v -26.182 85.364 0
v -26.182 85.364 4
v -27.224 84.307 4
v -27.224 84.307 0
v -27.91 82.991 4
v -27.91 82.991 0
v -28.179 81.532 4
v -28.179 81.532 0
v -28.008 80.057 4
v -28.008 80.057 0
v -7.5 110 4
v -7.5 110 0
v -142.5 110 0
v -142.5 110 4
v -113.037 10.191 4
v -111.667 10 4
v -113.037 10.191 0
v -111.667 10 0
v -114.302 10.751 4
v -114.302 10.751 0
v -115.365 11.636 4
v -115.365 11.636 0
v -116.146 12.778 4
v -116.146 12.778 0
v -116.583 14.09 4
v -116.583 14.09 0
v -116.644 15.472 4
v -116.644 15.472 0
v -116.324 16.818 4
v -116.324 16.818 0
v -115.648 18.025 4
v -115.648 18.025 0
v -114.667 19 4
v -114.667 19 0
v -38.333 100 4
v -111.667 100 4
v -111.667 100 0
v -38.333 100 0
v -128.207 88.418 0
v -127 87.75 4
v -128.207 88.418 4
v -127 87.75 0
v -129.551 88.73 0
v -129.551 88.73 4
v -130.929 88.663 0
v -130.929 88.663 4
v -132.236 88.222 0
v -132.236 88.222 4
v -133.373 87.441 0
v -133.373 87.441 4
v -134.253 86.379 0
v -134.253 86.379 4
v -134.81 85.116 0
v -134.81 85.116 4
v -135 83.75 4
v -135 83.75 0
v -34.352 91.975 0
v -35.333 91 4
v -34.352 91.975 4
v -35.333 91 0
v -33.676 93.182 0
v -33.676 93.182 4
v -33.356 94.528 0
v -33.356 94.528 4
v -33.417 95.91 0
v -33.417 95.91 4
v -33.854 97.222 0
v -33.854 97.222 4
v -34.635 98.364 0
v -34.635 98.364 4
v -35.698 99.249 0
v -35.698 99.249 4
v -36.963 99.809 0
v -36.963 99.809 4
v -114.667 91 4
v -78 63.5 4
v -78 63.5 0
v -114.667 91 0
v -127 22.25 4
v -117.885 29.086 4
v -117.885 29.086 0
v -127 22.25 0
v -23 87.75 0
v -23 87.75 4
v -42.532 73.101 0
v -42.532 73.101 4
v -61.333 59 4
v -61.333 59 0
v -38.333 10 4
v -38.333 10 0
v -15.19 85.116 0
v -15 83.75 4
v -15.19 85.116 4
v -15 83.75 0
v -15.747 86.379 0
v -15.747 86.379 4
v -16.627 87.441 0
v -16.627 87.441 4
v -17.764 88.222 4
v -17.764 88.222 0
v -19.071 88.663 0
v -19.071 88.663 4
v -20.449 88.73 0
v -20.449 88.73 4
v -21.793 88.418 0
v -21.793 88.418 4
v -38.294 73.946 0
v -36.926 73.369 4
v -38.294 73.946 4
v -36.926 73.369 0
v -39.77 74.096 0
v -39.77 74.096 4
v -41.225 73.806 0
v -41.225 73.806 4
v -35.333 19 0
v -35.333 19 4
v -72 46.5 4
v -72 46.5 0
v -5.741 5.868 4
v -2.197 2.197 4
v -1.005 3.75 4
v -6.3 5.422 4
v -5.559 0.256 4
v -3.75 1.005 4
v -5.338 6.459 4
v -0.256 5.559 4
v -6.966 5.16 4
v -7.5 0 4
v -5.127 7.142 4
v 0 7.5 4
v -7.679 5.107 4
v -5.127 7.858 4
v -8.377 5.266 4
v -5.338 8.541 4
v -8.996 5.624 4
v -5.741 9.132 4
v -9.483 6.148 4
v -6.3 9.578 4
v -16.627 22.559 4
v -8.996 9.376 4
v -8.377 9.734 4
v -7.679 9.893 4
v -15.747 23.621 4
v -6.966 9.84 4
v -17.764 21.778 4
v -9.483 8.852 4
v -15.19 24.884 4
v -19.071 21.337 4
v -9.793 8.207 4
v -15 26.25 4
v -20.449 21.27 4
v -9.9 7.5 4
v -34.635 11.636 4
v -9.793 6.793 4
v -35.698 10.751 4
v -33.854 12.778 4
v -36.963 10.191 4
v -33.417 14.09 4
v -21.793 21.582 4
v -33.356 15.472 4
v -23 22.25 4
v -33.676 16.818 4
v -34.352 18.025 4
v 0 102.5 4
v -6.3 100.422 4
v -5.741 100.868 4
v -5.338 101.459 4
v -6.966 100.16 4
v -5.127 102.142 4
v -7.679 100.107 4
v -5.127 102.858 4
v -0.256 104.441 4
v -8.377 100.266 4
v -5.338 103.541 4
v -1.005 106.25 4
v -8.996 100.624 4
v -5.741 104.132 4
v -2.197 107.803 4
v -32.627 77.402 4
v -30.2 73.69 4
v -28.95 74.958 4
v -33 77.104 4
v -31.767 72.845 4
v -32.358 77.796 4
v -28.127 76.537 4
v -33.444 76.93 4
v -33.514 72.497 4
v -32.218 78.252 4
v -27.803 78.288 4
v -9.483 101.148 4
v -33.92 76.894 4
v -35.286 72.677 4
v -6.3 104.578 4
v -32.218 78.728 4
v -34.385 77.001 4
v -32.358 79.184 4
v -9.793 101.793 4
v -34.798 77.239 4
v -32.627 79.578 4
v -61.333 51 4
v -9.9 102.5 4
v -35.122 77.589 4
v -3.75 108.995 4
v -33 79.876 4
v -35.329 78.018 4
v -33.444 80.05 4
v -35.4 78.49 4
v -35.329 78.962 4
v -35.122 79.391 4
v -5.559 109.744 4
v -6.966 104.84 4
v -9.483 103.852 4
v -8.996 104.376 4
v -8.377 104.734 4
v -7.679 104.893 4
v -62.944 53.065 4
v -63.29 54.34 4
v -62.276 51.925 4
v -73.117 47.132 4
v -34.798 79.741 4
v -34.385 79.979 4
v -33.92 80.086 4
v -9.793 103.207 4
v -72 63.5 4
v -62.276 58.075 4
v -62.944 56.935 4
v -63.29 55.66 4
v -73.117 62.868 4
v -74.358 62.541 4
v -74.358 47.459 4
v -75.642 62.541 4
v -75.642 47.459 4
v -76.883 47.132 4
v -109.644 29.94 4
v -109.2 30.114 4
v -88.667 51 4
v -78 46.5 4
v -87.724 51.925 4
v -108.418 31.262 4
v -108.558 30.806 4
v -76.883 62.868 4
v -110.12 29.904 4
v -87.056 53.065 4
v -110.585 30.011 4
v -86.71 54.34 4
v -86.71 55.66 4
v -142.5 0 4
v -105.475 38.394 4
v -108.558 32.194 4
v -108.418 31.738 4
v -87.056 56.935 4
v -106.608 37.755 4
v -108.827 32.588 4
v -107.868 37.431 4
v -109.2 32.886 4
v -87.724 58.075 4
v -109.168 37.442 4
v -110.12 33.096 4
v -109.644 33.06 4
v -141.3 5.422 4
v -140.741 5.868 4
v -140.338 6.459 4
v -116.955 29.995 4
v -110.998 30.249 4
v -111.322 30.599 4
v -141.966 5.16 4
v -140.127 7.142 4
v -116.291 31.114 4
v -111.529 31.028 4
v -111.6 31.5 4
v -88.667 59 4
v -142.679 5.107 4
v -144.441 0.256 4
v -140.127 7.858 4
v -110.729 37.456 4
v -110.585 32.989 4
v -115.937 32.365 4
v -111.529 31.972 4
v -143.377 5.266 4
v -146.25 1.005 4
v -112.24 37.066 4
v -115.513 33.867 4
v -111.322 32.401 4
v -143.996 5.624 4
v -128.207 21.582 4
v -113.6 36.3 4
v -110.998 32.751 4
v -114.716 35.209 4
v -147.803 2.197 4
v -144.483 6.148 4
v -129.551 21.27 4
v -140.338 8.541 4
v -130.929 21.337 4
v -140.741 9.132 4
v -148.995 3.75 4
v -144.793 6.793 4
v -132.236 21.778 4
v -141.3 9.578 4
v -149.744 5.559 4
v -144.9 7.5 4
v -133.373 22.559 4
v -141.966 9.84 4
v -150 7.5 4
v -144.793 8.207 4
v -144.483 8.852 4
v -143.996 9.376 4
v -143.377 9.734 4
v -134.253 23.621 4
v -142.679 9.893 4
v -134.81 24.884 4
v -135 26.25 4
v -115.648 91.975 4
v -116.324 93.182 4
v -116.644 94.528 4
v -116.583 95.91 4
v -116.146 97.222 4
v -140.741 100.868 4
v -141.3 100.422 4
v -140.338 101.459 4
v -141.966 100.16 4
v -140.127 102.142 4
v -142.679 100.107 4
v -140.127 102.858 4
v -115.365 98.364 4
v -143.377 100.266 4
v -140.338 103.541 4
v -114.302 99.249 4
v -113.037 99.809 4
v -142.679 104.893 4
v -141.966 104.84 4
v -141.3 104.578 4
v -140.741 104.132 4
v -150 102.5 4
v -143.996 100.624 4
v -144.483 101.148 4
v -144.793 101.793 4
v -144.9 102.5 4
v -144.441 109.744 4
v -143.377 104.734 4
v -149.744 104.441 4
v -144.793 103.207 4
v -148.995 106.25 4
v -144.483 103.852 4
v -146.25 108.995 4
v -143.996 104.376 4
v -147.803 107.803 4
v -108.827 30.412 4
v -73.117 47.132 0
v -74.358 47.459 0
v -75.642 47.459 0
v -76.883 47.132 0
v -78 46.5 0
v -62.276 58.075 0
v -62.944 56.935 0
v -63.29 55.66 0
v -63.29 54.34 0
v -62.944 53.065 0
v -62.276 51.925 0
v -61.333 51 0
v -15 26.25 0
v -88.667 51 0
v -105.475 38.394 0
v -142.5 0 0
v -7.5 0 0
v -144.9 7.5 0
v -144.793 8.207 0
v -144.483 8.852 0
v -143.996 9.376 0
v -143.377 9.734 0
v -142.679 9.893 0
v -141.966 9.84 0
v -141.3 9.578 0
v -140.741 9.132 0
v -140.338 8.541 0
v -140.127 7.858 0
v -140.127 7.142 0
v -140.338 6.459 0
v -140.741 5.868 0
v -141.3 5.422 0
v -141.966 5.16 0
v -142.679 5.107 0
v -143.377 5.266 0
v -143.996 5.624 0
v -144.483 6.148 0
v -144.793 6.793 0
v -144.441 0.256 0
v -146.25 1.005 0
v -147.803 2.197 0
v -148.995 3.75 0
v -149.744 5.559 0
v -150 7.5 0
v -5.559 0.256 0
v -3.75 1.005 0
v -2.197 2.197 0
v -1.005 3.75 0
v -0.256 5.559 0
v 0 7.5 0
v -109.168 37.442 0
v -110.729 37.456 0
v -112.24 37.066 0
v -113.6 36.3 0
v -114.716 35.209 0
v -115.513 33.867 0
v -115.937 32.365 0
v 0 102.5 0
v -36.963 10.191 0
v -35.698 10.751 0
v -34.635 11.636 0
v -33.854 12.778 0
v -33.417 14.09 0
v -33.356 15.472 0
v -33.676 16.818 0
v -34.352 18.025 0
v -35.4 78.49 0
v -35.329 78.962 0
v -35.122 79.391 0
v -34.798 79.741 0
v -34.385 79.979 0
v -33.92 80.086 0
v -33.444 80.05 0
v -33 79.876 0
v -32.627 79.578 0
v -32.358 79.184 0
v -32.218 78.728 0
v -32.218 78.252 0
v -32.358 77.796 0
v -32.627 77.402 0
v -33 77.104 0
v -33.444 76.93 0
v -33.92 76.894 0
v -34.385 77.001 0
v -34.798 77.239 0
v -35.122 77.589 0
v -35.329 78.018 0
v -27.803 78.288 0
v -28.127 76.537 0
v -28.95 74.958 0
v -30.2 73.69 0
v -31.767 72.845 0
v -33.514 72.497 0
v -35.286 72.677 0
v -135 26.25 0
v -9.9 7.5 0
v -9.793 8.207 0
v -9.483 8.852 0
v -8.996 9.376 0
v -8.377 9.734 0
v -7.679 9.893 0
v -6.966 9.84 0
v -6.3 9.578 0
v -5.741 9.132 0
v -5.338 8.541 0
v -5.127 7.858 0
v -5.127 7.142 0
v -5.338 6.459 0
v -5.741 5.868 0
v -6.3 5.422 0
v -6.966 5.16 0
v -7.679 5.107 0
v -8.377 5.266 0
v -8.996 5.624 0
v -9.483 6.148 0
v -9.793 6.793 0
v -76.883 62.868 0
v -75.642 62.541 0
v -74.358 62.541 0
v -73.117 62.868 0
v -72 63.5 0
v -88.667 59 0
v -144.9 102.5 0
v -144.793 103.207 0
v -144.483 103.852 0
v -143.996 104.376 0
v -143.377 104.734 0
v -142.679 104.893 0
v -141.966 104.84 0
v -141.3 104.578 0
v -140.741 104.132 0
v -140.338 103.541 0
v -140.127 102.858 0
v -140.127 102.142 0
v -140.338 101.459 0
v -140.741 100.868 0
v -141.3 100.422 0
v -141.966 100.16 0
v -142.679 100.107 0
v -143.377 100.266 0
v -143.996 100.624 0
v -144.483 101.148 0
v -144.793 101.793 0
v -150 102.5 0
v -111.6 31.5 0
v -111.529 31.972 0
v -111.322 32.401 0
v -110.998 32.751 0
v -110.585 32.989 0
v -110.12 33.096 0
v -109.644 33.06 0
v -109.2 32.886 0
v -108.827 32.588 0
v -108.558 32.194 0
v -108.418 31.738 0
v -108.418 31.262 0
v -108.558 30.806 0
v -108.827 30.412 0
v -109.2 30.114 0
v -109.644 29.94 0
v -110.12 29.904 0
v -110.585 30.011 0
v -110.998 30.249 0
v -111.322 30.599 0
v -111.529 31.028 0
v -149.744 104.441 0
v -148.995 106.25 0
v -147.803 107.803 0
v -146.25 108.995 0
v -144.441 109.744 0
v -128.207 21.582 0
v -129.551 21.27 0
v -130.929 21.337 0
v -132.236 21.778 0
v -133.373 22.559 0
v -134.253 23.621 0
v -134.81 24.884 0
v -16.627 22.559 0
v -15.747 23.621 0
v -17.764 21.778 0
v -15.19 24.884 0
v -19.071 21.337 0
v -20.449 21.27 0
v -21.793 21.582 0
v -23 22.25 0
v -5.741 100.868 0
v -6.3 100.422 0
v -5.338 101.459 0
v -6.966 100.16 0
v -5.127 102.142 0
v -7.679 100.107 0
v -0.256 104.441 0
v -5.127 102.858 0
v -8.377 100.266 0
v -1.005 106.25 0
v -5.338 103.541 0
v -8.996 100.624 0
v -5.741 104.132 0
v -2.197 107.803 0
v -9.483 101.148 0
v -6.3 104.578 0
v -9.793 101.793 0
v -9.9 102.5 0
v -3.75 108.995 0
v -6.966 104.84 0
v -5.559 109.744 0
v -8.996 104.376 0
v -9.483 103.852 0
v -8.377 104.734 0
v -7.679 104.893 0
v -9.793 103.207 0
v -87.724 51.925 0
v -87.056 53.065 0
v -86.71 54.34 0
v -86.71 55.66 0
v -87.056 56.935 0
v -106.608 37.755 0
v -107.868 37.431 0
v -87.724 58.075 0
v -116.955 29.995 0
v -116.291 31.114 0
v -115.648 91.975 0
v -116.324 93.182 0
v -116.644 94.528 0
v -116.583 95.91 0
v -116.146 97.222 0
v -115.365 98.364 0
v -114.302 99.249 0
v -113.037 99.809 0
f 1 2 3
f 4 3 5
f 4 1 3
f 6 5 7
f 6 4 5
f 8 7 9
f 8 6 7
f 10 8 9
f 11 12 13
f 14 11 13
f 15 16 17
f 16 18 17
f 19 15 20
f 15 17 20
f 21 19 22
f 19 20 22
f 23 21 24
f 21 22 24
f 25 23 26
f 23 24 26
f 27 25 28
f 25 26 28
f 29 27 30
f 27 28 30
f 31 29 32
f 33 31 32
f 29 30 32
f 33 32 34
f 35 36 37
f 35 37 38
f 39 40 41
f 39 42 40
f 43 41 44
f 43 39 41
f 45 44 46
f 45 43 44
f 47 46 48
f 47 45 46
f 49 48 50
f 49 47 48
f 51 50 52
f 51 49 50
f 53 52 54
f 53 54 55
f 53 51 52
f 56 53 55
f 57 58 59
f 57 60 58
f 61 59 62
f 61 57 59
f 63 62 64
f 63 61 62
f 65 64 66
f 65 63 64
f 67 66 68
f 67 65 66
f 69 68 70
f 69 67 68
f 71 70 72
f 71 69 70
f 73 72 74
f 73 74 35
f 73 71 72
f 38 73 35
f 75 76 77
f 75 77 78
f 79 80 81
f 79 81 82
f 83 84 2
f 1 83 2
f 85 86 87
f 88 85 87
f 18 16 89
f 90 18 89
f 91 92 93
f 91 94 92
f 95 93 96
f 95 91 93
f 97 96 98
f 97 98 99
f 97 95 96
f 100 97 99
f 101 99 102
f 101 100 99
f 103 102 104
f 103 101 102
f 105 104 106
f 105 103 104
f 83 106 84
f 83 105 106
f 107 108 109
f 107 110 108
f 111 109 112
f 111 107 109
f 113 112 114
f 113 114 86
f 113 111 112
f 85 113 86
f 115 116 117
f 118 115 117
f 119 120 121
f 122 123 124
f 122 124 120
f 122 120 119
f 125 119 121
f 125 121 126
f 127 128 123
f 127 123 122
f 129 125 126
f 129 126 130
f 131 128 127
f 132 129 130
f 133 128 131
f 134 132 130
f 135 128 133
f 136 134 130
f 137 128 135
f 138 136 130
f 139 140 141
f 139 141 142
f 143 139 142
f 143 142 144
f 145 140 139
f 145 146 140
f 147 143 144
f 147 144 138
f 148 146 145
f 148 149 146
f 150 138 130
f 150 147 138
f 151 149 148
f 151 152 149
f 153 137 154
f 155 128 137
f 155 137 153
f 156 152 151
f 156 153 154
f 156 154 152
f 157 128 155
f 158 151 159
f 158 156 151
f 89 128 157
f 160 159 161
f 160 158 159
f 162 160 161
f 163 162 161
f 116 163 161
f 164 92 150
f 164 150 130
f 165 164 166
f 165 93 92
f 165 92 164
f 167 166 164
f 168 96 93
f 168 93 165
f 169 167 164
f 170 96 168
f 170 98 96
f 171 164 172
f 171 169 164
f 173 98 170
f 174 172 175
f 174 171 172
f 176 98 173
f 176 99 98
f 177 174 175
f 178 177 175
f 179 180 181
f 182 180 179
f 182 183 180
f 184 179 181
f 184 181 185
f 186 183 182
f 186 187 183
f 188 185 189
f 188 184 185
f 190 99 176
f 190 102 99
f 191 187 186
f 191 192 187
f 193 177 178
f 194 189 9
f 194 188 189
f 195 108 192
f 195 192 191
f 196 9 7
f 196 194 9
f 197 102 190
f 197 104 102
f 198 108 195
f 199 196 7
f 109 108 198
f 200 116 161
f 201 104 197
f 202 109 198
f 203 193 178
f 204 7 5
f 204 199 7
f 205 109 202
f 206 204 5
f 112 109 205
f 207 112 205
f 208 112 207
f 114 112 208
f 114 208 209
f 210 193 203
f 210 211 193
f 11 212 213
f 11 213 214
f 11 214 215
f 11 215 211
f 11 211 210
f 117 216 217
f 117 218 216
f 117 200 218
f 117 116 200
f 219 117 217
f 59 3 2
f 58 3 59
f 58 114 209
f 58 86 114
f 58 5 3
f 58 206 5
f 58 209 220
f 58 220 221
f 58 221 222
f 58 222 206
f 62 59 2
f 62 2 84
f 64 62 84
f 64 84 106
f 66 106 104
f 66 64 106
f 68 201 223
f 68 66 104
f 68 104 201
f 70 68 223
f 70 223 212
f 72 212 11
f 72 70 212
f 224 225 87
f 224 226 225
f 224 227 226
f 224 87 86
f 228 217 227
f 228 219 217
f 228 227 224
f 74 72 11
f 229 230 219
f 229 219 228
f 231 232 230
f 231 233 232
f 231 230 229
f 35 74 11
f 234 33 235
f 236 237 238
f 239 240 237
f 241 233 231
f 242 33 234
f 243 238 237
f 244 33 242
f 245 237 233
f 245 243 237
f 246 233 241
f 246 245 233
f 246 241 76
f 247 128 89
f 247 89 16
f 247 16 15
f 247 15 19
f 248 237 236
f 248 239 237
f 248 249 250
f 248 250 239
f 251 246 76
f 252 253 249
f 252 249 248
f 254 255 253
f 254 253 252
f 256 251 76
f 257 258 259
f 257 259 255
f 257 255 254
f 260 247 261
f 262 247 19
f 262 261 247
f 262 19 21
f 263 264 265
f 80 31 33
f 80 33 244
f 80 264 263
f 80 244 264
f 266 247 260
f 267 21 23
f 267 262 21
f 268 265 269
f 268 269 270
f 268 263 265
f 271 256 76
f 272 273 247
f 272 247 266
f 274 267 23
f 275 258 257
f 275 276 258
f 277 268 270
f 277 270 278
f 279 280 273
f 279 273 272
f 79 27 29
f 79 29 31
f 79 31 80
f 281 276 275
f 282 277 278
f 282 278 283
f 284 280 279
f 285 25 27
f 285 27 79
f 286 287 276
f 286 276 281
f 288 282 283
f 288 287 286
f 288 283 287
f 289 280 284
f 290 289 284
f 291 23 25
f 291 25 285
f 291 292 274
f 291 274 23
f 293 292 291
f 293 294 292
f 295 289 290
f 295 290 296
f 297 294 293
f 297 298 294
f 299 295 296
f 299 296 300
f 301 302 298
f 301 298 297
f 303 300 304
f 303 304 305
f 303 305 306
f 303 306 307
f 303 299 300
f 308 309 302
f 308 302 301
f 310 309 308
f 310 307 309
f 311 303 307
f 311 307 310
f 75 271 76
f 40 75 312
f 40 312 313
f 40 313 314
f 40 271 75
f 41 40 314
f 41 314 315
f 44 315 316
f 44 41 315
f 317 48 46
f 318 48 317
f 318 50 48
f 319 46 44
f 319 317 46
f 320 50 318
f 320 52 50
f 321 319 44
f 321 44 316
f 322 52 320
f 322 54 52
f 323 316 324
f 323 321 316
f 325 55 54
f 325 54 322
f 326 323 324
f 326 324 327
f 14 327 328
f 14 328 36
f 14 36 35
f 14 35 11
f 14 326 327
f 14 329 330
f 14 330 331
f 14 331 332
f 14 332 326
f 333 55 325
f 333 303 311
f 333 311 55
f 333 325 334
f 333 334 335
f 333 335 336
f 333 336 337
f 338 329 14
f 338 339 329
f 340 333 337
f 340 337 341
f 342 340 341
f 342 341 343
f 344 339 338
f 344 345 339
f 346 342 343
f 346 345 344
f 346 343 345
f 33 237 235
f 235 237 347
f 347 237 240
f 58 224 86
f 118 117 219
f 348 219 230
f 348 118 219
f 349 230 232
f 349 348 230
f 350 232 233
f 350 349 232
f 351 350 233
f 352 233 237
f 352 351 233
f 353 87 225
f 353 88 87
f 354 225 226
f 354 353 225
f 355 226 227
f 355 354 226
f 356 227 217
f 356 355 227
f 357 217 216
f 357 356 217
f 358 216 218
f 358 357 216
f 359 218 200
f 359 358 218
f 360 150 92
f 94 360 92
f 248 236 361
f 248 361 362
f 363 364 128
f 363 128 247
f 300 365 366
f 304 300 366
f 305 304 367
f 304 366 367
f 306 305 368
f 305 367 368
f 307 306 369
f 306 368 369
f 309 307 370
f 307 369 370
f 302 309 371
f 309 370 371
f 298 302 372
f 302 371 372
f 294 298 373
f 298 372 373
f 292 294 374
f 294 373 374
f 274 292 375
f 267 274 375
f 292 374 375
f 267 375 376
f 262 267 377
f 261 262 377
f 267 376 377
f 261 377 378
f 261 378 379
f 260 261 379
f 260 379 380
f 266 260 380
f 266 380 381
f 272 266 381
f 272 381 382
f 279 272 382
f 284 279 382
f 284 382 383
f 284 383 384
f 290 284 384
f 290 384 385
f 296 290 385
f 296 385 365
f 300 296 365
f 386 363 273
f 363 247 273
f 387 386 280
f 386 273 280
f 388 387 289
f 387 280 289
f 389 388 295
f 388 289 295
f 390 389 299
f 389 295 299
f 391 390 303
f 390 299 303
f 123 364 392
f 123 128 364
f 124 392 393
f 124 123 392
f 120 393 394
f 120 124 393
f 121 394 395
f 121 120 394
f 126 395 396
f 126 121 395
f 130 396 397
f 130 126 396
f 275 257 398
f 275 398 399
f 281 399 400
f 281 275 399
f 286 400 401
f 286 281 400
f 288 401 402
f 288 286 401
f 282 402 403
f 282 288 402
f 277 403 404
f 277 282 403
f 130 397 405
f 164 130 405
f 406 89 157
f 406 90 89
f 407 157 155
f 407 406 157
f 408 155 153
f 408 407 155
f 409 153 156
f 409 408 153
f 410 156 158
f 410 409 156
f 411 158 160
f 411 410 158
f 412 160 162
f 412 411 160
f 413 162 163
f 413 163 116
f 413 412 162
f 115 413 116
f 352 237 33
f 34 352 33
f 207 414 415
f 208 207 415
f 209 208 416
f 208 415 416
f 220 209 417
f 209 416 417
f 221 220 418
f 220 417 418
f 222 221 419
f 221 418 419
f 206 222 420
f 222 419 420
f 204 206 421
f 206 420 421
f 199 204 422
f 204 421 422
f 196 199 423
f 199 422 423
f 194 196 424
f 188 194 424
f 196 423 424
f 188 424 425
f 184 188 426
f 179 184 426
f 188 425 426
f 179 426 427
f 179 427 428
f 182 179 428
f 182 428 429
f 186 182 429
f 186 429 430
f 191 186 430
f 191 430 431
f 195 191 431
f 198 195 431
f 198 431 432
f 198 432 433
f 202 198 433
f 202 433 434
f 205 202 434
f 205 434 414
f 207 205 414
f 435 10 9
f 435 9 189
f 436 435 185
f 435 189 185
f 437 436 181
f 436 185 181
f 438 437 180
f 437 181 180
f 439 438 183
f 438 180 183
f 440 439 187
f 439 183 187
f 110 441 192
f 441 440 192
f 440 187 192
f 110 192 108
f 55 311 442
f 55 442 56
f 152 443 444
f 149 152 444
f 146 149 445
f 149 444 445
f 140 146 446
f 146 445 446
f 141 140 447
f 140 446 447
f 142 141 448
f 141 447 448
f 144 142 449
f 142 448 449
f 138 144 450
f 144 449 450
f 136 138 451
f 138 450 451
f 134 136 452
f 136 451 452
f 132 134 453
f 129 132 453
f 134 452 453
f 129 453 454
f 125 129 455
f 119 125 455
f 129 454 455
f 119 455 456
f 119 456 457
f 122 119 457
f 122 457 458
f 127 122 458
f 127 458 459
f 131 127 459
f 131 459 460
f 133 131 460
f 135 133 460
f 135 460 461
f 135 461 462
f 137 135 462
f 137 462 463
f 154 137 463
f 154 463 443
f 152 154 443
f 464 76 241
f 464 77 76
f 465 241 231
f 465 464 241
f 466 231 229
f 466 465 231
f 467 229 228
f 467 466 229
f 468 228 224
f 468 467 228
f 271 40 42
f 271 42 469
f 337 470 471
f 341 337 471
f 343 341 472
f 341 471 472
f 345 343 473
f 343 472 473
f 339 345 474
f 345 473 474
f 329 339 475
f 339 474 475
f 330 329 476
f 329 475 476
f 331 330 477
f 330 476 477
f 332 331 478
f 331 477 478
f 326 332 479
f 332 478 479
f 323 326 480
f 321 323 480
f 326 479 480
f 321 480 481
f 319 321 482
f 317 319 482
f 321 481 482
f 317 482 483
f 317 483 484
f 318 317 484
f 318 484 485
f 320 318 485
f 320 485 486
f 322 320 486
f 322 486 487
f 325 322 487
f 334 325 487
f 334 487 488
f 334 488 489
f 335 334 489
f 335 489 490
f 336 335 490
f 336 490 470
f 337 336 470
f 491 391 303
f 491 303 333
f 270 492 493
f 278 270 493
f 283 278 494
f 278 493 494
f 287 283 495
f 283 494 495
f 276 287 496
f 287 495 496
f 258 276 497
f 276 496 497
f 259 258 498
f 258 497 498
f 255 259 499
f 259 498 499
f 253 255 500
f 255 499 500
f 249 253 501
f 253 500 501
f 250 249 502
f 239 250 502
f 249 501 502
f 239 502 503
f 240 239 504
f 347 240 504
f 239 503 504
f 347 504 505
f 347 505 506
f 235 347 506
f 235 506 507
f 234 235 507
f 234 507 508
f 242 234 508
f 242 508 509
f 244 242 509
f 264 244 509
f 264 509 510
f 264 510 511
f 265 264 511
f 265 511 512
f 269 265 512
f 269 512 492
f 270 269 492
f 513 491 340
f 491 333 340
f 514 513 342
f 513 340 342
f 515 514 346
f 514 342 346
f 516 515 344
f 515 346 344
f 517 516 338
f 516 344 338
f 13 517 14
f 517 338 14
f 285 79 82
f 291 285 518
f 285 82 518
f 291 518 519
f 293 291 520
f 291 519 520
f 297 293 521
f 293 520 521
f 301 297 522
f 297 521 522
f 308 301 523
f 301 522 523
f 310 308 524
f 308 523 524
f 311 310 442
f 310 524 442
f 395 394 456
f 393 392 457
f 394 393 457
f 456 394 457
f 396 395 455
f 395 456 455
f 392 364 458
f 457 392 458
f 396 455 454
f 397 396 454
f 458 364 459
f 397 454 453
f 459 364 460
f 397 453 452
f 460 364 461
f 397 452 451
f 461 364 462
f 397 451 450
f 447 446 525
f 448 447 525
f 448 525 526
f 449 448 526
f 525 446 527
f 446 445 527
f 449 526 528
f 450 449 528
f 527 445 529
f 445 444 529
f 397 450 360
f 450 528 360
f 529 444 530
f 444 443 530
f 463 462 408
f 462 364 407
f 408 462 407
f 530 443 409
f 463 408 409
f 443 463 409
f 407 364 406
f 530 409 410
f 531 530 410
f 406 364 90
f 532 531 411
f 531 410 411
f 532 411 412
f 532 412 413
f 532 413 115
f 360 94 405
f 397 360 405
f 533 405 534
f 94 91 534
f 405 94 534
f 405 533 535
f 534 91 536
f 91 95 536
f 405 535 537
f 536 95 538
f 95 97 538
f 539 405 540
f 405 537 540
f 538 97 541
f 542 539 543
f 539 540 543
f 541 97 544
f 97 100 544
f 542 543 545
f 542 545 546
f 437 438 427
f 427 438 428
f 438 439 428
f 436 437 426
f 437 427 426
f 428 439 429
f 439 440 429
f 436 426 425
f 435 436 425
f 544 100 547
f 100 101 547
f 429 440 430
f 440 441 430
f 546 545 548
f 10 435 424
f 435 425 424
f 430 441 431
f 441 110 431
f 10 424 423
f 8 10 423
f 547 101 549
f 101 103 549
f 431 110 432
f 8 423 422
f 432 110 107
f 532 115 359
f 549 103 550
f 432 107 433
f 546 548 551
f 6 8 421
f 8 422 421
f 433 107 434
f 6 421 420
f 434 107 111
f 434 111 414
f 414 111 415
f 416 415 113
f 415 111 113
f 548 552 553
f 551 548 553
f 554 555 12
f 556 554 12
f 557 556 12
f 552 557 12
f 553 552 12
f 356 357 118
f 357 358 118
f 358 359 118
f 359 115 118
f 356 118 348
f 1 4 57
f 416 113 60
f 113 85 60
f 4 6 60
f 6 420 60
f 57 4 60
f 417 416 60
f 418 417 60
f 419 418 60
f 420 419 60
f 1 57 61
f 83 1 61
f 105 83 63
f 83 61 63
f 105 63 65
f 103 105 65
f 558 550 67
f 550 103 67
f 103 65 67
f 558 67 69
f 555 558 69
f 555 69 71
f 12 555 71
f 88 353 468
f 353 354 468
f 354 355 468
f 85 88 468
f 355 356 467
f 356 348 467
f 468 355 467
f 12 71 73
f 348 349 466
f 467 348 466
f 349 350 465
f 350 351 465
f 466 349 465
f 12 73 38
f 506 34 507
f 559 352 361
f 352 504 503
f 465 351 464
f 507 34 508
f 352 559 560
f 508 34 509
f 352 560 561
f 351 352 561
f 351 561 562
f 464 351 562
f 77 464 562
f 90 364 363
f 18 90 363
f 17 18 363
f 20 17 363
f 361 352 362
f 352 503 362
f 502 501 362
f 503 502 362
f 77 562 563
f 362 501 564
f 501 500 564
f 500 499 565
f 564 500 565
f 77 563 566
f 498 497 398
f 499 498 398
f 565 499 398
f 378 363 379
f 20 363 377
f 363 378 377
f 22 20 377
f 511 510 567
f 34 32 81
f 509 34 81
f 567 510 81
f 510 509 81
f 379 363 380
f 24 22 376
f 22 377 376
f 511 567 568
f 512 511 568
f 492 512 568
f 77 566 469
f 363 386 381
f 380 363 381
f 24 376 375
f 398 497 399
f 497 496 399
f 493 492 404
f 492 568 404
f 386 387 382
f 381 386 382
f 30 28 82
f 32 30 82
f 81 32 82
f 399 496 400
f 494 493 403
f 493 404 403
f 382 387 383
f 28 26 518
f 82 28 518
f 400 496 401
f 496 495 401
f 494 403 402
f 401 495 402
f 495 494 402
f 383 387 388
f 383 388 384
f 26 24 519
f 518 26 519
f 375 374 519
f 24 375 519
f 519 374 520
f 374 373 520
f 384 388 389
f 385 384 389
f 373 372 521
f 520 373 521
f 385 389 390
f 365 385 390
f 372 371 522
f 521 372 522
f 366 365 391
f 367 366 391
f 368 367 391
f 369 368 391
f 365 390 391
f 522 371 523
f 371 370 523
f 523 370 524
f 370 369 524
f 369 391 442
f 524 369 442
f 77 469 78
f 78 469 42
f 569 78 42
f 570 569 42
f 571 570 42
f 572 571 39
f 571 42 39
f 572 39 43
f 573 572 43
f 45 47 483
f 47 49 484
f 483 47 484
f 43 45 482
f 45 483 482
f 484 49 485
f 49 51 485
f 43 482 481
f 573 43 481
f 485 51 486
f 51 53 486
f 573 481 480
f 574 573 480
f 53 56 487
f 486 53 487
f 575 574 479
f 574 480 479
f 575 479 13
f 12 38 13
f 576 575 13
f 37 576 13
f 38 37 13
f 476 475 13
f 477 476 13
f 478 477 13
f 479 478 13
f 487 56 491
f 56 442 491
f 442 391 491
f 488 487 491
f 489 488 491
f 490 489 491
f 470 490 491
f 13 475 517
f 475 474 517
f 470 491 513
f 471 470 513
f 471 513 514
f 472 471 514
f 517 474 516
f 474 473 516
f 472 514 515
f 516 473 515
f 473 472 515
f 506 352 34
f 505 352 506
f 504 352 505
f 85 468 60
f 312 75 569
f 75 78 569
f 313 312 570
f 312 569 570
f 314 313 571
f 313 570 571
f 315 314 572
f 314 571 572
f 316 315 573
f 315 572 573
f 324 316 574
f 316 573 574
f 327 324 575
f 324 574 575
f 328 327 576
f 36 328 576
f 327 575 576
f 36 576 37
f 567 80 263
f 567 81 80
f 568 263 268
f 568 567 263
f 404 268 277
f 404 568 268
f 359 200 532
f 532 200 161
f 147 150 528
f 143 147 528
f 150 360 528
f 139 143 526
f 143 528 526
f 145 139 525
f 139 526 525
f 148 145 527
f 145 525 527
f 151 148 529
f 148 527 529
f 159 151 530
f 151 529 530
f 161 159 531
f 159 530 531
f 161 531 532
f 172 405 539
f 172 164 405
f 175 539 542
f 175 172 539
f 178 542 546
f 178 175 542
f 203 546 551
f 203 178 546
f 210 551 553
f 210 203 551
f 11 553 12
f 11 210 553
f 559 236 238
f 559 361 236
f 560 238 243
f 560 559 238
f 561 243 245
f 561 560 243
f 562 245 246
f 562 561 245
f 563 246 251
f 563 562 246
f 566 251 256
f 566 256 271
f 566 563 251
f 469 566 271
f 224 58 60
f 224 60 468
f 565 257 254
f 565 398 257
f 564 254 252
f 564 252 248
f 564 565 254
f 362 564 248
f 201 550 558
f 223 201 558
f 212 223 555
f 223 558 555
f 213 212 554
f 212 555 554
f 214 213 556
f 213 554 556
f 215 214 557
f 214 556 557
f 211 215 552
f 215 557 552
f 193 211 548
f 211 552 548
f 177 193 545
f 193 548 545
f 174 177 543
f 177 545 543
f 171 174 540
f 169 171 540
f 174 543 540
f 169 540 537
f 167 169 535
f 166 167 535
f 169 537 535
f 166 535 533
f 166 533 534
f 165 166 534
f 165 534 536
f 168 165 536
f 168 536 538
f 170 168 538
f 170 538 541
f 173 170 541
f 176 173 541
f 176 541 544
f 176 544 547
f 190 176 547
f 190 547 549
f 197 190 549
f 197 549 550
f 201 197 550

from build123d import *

# Parameters (mm, degrees)
SKETCH_1_W           = 110
SKETCH_1_H           = 150
EXTRUDE_1_DEPTH      = 4
HOLE_WIZARD_M4_1_D   = 4.8
HOLE_WIZARD_M3_1_D   = 3.2
SKETCH_6_OUTSIDE_W   = 189.21
SKETCH_6_OUTSIDE_H   = 149.21
SKETCH_6_OUTSIDE_W_2 = 150
SKETCH_6_OUTSIDE_H_2 = 110
CUT_EXTRUDE_1_DEPTH  = 5
FILLET_3_R           = 5
FILLET_1_R           = 7.5


with BuildPart() as part:
    # ｽｹｯﾁ1 → ﾎﾞｽ - 押し出し1 (new body)
    with BuildSketch(Plane(origin=(0, 0, 0), x_dir=(0, 1, 0), z_dir=(0, 0, 1))):
        with Locations((55, 75)):
            Rectangle(SKETCH_1_W, SKETCH_1_H)
    extrude(amount=EXTRUDE_1_DEPTH)

    # M4 すきま穴1 (through all)
    with Locations(Plane.XY.offset(4)):
        with Locations((-142.5, 102.5), (-142.5, 7.5), (-7.5, 102.5), (-7.5, 7.5)):
            Hole(HOLE_WIZARD_M4_1_D / 2)

    # M3 すきま穴1 (through all)
    with Locations(Plane.XY.offset(4)):
        with Locations((-110, 31.5), (-33.8, 78.49)):
            Hole(HOLE_WIZARD_M3_1_D / 2)

    # ｽｹｯﾁ6 outside → ｶｯﾄ - 押し出し1 (cut, through all)
    with BuildSketch(Plane.XY.offset(4)):
        with Locations((-75, 55)):
            Rectangle(SKETCH_6_OUTSIDE_W, SKETCH_6_OUTSIDE_H)
        with Locations((-75, 55)):
            Rectangle(SKETCH_6_OUTSIDE_W_2, SKETCH_6_OUTSIDE_H_2, mode=Mode.SUBTRACT)
        Polygon((-126.666666667, 10), (-23.333333333, 10), (-75, 48.75), align=None)
        with BuildLine():
            Line((-135, 16.25), (-135, 93.75))
            Line((-135, 93.75), (-83.333333333, 55))
            Line((-83.333333333, 55), (-107.434720268, 36.923959799))
            ThreePointArc((-107.434720268, 36.923959799), (-113.6, 36.3), (-115.925279732, 30.556040201))
            Line((-115.925279732, 30.556040201), (-135, 16.25))
        make_face()
        Polygon((-126.666666667, 100), (-23.333333333, 100), (-75, 61.25), align=None)
        with BuildLine():
            Line((-15, 16.25), (-15, 93.75))
            Line((-15, 93.75), (-29.614559787, 82.78908016))
            ThreePointArc((-29.614559787, 82.78908016), (-30.2, 73.69), (-39.099040213, 75.67571984))
            Line((-39.099040213, 75.67571984), (-66.666666667, 55))
            Line((-66.666666667, 55), (-15, 16.25))
        make_face()
    extrude(amount=-CUT_EXTRUDE_1_DEPTH, mode=Mode.SUBTRACT)

    # ﾌｨﾚｯﾄ3
    fillet_3_edges = [part.edges().sort_by_distance(p)[0] for p in [
        (-75, 48.75, 2),
        (-23.333333333, 10, 2),
        (-126.666666667, 10, 2),
        (-135, 93.75, 2),
        (-83.333333333, 55, 2),
        (-107.434720268, 36.923959799, 2),
        (-115.925279732, 30.556040201, 2),
        (-135, 16.25, 2),
        (-15, 16.25, 2),
        (-66.666666667, 55, 2),
        (-39.099040213, 75.67571984, 2),
        (-29.614559787, 82.78908016, 2),
        (-15, 93.75, 2),
        (-75, 61.25, 2),
        (-126.666666667, 100, 2),
        (-23.333333333, 100, 2),
    ]]
    fillet(fillet_3_edges, radius=FILLET_3_R)

    # ﾌｨﾚｯﾄ1
    fillet_1_edges = [part.edges().sort_by_distance(p)[0] for p in [
        (-150, 0, 2),
        (-150, 110, 2),
        (0, 110, 2),
        (0, 0, 2),
    ]]
    fillet(fillet_1_edges, radius=FILLET_1_R)


solid = part.part
